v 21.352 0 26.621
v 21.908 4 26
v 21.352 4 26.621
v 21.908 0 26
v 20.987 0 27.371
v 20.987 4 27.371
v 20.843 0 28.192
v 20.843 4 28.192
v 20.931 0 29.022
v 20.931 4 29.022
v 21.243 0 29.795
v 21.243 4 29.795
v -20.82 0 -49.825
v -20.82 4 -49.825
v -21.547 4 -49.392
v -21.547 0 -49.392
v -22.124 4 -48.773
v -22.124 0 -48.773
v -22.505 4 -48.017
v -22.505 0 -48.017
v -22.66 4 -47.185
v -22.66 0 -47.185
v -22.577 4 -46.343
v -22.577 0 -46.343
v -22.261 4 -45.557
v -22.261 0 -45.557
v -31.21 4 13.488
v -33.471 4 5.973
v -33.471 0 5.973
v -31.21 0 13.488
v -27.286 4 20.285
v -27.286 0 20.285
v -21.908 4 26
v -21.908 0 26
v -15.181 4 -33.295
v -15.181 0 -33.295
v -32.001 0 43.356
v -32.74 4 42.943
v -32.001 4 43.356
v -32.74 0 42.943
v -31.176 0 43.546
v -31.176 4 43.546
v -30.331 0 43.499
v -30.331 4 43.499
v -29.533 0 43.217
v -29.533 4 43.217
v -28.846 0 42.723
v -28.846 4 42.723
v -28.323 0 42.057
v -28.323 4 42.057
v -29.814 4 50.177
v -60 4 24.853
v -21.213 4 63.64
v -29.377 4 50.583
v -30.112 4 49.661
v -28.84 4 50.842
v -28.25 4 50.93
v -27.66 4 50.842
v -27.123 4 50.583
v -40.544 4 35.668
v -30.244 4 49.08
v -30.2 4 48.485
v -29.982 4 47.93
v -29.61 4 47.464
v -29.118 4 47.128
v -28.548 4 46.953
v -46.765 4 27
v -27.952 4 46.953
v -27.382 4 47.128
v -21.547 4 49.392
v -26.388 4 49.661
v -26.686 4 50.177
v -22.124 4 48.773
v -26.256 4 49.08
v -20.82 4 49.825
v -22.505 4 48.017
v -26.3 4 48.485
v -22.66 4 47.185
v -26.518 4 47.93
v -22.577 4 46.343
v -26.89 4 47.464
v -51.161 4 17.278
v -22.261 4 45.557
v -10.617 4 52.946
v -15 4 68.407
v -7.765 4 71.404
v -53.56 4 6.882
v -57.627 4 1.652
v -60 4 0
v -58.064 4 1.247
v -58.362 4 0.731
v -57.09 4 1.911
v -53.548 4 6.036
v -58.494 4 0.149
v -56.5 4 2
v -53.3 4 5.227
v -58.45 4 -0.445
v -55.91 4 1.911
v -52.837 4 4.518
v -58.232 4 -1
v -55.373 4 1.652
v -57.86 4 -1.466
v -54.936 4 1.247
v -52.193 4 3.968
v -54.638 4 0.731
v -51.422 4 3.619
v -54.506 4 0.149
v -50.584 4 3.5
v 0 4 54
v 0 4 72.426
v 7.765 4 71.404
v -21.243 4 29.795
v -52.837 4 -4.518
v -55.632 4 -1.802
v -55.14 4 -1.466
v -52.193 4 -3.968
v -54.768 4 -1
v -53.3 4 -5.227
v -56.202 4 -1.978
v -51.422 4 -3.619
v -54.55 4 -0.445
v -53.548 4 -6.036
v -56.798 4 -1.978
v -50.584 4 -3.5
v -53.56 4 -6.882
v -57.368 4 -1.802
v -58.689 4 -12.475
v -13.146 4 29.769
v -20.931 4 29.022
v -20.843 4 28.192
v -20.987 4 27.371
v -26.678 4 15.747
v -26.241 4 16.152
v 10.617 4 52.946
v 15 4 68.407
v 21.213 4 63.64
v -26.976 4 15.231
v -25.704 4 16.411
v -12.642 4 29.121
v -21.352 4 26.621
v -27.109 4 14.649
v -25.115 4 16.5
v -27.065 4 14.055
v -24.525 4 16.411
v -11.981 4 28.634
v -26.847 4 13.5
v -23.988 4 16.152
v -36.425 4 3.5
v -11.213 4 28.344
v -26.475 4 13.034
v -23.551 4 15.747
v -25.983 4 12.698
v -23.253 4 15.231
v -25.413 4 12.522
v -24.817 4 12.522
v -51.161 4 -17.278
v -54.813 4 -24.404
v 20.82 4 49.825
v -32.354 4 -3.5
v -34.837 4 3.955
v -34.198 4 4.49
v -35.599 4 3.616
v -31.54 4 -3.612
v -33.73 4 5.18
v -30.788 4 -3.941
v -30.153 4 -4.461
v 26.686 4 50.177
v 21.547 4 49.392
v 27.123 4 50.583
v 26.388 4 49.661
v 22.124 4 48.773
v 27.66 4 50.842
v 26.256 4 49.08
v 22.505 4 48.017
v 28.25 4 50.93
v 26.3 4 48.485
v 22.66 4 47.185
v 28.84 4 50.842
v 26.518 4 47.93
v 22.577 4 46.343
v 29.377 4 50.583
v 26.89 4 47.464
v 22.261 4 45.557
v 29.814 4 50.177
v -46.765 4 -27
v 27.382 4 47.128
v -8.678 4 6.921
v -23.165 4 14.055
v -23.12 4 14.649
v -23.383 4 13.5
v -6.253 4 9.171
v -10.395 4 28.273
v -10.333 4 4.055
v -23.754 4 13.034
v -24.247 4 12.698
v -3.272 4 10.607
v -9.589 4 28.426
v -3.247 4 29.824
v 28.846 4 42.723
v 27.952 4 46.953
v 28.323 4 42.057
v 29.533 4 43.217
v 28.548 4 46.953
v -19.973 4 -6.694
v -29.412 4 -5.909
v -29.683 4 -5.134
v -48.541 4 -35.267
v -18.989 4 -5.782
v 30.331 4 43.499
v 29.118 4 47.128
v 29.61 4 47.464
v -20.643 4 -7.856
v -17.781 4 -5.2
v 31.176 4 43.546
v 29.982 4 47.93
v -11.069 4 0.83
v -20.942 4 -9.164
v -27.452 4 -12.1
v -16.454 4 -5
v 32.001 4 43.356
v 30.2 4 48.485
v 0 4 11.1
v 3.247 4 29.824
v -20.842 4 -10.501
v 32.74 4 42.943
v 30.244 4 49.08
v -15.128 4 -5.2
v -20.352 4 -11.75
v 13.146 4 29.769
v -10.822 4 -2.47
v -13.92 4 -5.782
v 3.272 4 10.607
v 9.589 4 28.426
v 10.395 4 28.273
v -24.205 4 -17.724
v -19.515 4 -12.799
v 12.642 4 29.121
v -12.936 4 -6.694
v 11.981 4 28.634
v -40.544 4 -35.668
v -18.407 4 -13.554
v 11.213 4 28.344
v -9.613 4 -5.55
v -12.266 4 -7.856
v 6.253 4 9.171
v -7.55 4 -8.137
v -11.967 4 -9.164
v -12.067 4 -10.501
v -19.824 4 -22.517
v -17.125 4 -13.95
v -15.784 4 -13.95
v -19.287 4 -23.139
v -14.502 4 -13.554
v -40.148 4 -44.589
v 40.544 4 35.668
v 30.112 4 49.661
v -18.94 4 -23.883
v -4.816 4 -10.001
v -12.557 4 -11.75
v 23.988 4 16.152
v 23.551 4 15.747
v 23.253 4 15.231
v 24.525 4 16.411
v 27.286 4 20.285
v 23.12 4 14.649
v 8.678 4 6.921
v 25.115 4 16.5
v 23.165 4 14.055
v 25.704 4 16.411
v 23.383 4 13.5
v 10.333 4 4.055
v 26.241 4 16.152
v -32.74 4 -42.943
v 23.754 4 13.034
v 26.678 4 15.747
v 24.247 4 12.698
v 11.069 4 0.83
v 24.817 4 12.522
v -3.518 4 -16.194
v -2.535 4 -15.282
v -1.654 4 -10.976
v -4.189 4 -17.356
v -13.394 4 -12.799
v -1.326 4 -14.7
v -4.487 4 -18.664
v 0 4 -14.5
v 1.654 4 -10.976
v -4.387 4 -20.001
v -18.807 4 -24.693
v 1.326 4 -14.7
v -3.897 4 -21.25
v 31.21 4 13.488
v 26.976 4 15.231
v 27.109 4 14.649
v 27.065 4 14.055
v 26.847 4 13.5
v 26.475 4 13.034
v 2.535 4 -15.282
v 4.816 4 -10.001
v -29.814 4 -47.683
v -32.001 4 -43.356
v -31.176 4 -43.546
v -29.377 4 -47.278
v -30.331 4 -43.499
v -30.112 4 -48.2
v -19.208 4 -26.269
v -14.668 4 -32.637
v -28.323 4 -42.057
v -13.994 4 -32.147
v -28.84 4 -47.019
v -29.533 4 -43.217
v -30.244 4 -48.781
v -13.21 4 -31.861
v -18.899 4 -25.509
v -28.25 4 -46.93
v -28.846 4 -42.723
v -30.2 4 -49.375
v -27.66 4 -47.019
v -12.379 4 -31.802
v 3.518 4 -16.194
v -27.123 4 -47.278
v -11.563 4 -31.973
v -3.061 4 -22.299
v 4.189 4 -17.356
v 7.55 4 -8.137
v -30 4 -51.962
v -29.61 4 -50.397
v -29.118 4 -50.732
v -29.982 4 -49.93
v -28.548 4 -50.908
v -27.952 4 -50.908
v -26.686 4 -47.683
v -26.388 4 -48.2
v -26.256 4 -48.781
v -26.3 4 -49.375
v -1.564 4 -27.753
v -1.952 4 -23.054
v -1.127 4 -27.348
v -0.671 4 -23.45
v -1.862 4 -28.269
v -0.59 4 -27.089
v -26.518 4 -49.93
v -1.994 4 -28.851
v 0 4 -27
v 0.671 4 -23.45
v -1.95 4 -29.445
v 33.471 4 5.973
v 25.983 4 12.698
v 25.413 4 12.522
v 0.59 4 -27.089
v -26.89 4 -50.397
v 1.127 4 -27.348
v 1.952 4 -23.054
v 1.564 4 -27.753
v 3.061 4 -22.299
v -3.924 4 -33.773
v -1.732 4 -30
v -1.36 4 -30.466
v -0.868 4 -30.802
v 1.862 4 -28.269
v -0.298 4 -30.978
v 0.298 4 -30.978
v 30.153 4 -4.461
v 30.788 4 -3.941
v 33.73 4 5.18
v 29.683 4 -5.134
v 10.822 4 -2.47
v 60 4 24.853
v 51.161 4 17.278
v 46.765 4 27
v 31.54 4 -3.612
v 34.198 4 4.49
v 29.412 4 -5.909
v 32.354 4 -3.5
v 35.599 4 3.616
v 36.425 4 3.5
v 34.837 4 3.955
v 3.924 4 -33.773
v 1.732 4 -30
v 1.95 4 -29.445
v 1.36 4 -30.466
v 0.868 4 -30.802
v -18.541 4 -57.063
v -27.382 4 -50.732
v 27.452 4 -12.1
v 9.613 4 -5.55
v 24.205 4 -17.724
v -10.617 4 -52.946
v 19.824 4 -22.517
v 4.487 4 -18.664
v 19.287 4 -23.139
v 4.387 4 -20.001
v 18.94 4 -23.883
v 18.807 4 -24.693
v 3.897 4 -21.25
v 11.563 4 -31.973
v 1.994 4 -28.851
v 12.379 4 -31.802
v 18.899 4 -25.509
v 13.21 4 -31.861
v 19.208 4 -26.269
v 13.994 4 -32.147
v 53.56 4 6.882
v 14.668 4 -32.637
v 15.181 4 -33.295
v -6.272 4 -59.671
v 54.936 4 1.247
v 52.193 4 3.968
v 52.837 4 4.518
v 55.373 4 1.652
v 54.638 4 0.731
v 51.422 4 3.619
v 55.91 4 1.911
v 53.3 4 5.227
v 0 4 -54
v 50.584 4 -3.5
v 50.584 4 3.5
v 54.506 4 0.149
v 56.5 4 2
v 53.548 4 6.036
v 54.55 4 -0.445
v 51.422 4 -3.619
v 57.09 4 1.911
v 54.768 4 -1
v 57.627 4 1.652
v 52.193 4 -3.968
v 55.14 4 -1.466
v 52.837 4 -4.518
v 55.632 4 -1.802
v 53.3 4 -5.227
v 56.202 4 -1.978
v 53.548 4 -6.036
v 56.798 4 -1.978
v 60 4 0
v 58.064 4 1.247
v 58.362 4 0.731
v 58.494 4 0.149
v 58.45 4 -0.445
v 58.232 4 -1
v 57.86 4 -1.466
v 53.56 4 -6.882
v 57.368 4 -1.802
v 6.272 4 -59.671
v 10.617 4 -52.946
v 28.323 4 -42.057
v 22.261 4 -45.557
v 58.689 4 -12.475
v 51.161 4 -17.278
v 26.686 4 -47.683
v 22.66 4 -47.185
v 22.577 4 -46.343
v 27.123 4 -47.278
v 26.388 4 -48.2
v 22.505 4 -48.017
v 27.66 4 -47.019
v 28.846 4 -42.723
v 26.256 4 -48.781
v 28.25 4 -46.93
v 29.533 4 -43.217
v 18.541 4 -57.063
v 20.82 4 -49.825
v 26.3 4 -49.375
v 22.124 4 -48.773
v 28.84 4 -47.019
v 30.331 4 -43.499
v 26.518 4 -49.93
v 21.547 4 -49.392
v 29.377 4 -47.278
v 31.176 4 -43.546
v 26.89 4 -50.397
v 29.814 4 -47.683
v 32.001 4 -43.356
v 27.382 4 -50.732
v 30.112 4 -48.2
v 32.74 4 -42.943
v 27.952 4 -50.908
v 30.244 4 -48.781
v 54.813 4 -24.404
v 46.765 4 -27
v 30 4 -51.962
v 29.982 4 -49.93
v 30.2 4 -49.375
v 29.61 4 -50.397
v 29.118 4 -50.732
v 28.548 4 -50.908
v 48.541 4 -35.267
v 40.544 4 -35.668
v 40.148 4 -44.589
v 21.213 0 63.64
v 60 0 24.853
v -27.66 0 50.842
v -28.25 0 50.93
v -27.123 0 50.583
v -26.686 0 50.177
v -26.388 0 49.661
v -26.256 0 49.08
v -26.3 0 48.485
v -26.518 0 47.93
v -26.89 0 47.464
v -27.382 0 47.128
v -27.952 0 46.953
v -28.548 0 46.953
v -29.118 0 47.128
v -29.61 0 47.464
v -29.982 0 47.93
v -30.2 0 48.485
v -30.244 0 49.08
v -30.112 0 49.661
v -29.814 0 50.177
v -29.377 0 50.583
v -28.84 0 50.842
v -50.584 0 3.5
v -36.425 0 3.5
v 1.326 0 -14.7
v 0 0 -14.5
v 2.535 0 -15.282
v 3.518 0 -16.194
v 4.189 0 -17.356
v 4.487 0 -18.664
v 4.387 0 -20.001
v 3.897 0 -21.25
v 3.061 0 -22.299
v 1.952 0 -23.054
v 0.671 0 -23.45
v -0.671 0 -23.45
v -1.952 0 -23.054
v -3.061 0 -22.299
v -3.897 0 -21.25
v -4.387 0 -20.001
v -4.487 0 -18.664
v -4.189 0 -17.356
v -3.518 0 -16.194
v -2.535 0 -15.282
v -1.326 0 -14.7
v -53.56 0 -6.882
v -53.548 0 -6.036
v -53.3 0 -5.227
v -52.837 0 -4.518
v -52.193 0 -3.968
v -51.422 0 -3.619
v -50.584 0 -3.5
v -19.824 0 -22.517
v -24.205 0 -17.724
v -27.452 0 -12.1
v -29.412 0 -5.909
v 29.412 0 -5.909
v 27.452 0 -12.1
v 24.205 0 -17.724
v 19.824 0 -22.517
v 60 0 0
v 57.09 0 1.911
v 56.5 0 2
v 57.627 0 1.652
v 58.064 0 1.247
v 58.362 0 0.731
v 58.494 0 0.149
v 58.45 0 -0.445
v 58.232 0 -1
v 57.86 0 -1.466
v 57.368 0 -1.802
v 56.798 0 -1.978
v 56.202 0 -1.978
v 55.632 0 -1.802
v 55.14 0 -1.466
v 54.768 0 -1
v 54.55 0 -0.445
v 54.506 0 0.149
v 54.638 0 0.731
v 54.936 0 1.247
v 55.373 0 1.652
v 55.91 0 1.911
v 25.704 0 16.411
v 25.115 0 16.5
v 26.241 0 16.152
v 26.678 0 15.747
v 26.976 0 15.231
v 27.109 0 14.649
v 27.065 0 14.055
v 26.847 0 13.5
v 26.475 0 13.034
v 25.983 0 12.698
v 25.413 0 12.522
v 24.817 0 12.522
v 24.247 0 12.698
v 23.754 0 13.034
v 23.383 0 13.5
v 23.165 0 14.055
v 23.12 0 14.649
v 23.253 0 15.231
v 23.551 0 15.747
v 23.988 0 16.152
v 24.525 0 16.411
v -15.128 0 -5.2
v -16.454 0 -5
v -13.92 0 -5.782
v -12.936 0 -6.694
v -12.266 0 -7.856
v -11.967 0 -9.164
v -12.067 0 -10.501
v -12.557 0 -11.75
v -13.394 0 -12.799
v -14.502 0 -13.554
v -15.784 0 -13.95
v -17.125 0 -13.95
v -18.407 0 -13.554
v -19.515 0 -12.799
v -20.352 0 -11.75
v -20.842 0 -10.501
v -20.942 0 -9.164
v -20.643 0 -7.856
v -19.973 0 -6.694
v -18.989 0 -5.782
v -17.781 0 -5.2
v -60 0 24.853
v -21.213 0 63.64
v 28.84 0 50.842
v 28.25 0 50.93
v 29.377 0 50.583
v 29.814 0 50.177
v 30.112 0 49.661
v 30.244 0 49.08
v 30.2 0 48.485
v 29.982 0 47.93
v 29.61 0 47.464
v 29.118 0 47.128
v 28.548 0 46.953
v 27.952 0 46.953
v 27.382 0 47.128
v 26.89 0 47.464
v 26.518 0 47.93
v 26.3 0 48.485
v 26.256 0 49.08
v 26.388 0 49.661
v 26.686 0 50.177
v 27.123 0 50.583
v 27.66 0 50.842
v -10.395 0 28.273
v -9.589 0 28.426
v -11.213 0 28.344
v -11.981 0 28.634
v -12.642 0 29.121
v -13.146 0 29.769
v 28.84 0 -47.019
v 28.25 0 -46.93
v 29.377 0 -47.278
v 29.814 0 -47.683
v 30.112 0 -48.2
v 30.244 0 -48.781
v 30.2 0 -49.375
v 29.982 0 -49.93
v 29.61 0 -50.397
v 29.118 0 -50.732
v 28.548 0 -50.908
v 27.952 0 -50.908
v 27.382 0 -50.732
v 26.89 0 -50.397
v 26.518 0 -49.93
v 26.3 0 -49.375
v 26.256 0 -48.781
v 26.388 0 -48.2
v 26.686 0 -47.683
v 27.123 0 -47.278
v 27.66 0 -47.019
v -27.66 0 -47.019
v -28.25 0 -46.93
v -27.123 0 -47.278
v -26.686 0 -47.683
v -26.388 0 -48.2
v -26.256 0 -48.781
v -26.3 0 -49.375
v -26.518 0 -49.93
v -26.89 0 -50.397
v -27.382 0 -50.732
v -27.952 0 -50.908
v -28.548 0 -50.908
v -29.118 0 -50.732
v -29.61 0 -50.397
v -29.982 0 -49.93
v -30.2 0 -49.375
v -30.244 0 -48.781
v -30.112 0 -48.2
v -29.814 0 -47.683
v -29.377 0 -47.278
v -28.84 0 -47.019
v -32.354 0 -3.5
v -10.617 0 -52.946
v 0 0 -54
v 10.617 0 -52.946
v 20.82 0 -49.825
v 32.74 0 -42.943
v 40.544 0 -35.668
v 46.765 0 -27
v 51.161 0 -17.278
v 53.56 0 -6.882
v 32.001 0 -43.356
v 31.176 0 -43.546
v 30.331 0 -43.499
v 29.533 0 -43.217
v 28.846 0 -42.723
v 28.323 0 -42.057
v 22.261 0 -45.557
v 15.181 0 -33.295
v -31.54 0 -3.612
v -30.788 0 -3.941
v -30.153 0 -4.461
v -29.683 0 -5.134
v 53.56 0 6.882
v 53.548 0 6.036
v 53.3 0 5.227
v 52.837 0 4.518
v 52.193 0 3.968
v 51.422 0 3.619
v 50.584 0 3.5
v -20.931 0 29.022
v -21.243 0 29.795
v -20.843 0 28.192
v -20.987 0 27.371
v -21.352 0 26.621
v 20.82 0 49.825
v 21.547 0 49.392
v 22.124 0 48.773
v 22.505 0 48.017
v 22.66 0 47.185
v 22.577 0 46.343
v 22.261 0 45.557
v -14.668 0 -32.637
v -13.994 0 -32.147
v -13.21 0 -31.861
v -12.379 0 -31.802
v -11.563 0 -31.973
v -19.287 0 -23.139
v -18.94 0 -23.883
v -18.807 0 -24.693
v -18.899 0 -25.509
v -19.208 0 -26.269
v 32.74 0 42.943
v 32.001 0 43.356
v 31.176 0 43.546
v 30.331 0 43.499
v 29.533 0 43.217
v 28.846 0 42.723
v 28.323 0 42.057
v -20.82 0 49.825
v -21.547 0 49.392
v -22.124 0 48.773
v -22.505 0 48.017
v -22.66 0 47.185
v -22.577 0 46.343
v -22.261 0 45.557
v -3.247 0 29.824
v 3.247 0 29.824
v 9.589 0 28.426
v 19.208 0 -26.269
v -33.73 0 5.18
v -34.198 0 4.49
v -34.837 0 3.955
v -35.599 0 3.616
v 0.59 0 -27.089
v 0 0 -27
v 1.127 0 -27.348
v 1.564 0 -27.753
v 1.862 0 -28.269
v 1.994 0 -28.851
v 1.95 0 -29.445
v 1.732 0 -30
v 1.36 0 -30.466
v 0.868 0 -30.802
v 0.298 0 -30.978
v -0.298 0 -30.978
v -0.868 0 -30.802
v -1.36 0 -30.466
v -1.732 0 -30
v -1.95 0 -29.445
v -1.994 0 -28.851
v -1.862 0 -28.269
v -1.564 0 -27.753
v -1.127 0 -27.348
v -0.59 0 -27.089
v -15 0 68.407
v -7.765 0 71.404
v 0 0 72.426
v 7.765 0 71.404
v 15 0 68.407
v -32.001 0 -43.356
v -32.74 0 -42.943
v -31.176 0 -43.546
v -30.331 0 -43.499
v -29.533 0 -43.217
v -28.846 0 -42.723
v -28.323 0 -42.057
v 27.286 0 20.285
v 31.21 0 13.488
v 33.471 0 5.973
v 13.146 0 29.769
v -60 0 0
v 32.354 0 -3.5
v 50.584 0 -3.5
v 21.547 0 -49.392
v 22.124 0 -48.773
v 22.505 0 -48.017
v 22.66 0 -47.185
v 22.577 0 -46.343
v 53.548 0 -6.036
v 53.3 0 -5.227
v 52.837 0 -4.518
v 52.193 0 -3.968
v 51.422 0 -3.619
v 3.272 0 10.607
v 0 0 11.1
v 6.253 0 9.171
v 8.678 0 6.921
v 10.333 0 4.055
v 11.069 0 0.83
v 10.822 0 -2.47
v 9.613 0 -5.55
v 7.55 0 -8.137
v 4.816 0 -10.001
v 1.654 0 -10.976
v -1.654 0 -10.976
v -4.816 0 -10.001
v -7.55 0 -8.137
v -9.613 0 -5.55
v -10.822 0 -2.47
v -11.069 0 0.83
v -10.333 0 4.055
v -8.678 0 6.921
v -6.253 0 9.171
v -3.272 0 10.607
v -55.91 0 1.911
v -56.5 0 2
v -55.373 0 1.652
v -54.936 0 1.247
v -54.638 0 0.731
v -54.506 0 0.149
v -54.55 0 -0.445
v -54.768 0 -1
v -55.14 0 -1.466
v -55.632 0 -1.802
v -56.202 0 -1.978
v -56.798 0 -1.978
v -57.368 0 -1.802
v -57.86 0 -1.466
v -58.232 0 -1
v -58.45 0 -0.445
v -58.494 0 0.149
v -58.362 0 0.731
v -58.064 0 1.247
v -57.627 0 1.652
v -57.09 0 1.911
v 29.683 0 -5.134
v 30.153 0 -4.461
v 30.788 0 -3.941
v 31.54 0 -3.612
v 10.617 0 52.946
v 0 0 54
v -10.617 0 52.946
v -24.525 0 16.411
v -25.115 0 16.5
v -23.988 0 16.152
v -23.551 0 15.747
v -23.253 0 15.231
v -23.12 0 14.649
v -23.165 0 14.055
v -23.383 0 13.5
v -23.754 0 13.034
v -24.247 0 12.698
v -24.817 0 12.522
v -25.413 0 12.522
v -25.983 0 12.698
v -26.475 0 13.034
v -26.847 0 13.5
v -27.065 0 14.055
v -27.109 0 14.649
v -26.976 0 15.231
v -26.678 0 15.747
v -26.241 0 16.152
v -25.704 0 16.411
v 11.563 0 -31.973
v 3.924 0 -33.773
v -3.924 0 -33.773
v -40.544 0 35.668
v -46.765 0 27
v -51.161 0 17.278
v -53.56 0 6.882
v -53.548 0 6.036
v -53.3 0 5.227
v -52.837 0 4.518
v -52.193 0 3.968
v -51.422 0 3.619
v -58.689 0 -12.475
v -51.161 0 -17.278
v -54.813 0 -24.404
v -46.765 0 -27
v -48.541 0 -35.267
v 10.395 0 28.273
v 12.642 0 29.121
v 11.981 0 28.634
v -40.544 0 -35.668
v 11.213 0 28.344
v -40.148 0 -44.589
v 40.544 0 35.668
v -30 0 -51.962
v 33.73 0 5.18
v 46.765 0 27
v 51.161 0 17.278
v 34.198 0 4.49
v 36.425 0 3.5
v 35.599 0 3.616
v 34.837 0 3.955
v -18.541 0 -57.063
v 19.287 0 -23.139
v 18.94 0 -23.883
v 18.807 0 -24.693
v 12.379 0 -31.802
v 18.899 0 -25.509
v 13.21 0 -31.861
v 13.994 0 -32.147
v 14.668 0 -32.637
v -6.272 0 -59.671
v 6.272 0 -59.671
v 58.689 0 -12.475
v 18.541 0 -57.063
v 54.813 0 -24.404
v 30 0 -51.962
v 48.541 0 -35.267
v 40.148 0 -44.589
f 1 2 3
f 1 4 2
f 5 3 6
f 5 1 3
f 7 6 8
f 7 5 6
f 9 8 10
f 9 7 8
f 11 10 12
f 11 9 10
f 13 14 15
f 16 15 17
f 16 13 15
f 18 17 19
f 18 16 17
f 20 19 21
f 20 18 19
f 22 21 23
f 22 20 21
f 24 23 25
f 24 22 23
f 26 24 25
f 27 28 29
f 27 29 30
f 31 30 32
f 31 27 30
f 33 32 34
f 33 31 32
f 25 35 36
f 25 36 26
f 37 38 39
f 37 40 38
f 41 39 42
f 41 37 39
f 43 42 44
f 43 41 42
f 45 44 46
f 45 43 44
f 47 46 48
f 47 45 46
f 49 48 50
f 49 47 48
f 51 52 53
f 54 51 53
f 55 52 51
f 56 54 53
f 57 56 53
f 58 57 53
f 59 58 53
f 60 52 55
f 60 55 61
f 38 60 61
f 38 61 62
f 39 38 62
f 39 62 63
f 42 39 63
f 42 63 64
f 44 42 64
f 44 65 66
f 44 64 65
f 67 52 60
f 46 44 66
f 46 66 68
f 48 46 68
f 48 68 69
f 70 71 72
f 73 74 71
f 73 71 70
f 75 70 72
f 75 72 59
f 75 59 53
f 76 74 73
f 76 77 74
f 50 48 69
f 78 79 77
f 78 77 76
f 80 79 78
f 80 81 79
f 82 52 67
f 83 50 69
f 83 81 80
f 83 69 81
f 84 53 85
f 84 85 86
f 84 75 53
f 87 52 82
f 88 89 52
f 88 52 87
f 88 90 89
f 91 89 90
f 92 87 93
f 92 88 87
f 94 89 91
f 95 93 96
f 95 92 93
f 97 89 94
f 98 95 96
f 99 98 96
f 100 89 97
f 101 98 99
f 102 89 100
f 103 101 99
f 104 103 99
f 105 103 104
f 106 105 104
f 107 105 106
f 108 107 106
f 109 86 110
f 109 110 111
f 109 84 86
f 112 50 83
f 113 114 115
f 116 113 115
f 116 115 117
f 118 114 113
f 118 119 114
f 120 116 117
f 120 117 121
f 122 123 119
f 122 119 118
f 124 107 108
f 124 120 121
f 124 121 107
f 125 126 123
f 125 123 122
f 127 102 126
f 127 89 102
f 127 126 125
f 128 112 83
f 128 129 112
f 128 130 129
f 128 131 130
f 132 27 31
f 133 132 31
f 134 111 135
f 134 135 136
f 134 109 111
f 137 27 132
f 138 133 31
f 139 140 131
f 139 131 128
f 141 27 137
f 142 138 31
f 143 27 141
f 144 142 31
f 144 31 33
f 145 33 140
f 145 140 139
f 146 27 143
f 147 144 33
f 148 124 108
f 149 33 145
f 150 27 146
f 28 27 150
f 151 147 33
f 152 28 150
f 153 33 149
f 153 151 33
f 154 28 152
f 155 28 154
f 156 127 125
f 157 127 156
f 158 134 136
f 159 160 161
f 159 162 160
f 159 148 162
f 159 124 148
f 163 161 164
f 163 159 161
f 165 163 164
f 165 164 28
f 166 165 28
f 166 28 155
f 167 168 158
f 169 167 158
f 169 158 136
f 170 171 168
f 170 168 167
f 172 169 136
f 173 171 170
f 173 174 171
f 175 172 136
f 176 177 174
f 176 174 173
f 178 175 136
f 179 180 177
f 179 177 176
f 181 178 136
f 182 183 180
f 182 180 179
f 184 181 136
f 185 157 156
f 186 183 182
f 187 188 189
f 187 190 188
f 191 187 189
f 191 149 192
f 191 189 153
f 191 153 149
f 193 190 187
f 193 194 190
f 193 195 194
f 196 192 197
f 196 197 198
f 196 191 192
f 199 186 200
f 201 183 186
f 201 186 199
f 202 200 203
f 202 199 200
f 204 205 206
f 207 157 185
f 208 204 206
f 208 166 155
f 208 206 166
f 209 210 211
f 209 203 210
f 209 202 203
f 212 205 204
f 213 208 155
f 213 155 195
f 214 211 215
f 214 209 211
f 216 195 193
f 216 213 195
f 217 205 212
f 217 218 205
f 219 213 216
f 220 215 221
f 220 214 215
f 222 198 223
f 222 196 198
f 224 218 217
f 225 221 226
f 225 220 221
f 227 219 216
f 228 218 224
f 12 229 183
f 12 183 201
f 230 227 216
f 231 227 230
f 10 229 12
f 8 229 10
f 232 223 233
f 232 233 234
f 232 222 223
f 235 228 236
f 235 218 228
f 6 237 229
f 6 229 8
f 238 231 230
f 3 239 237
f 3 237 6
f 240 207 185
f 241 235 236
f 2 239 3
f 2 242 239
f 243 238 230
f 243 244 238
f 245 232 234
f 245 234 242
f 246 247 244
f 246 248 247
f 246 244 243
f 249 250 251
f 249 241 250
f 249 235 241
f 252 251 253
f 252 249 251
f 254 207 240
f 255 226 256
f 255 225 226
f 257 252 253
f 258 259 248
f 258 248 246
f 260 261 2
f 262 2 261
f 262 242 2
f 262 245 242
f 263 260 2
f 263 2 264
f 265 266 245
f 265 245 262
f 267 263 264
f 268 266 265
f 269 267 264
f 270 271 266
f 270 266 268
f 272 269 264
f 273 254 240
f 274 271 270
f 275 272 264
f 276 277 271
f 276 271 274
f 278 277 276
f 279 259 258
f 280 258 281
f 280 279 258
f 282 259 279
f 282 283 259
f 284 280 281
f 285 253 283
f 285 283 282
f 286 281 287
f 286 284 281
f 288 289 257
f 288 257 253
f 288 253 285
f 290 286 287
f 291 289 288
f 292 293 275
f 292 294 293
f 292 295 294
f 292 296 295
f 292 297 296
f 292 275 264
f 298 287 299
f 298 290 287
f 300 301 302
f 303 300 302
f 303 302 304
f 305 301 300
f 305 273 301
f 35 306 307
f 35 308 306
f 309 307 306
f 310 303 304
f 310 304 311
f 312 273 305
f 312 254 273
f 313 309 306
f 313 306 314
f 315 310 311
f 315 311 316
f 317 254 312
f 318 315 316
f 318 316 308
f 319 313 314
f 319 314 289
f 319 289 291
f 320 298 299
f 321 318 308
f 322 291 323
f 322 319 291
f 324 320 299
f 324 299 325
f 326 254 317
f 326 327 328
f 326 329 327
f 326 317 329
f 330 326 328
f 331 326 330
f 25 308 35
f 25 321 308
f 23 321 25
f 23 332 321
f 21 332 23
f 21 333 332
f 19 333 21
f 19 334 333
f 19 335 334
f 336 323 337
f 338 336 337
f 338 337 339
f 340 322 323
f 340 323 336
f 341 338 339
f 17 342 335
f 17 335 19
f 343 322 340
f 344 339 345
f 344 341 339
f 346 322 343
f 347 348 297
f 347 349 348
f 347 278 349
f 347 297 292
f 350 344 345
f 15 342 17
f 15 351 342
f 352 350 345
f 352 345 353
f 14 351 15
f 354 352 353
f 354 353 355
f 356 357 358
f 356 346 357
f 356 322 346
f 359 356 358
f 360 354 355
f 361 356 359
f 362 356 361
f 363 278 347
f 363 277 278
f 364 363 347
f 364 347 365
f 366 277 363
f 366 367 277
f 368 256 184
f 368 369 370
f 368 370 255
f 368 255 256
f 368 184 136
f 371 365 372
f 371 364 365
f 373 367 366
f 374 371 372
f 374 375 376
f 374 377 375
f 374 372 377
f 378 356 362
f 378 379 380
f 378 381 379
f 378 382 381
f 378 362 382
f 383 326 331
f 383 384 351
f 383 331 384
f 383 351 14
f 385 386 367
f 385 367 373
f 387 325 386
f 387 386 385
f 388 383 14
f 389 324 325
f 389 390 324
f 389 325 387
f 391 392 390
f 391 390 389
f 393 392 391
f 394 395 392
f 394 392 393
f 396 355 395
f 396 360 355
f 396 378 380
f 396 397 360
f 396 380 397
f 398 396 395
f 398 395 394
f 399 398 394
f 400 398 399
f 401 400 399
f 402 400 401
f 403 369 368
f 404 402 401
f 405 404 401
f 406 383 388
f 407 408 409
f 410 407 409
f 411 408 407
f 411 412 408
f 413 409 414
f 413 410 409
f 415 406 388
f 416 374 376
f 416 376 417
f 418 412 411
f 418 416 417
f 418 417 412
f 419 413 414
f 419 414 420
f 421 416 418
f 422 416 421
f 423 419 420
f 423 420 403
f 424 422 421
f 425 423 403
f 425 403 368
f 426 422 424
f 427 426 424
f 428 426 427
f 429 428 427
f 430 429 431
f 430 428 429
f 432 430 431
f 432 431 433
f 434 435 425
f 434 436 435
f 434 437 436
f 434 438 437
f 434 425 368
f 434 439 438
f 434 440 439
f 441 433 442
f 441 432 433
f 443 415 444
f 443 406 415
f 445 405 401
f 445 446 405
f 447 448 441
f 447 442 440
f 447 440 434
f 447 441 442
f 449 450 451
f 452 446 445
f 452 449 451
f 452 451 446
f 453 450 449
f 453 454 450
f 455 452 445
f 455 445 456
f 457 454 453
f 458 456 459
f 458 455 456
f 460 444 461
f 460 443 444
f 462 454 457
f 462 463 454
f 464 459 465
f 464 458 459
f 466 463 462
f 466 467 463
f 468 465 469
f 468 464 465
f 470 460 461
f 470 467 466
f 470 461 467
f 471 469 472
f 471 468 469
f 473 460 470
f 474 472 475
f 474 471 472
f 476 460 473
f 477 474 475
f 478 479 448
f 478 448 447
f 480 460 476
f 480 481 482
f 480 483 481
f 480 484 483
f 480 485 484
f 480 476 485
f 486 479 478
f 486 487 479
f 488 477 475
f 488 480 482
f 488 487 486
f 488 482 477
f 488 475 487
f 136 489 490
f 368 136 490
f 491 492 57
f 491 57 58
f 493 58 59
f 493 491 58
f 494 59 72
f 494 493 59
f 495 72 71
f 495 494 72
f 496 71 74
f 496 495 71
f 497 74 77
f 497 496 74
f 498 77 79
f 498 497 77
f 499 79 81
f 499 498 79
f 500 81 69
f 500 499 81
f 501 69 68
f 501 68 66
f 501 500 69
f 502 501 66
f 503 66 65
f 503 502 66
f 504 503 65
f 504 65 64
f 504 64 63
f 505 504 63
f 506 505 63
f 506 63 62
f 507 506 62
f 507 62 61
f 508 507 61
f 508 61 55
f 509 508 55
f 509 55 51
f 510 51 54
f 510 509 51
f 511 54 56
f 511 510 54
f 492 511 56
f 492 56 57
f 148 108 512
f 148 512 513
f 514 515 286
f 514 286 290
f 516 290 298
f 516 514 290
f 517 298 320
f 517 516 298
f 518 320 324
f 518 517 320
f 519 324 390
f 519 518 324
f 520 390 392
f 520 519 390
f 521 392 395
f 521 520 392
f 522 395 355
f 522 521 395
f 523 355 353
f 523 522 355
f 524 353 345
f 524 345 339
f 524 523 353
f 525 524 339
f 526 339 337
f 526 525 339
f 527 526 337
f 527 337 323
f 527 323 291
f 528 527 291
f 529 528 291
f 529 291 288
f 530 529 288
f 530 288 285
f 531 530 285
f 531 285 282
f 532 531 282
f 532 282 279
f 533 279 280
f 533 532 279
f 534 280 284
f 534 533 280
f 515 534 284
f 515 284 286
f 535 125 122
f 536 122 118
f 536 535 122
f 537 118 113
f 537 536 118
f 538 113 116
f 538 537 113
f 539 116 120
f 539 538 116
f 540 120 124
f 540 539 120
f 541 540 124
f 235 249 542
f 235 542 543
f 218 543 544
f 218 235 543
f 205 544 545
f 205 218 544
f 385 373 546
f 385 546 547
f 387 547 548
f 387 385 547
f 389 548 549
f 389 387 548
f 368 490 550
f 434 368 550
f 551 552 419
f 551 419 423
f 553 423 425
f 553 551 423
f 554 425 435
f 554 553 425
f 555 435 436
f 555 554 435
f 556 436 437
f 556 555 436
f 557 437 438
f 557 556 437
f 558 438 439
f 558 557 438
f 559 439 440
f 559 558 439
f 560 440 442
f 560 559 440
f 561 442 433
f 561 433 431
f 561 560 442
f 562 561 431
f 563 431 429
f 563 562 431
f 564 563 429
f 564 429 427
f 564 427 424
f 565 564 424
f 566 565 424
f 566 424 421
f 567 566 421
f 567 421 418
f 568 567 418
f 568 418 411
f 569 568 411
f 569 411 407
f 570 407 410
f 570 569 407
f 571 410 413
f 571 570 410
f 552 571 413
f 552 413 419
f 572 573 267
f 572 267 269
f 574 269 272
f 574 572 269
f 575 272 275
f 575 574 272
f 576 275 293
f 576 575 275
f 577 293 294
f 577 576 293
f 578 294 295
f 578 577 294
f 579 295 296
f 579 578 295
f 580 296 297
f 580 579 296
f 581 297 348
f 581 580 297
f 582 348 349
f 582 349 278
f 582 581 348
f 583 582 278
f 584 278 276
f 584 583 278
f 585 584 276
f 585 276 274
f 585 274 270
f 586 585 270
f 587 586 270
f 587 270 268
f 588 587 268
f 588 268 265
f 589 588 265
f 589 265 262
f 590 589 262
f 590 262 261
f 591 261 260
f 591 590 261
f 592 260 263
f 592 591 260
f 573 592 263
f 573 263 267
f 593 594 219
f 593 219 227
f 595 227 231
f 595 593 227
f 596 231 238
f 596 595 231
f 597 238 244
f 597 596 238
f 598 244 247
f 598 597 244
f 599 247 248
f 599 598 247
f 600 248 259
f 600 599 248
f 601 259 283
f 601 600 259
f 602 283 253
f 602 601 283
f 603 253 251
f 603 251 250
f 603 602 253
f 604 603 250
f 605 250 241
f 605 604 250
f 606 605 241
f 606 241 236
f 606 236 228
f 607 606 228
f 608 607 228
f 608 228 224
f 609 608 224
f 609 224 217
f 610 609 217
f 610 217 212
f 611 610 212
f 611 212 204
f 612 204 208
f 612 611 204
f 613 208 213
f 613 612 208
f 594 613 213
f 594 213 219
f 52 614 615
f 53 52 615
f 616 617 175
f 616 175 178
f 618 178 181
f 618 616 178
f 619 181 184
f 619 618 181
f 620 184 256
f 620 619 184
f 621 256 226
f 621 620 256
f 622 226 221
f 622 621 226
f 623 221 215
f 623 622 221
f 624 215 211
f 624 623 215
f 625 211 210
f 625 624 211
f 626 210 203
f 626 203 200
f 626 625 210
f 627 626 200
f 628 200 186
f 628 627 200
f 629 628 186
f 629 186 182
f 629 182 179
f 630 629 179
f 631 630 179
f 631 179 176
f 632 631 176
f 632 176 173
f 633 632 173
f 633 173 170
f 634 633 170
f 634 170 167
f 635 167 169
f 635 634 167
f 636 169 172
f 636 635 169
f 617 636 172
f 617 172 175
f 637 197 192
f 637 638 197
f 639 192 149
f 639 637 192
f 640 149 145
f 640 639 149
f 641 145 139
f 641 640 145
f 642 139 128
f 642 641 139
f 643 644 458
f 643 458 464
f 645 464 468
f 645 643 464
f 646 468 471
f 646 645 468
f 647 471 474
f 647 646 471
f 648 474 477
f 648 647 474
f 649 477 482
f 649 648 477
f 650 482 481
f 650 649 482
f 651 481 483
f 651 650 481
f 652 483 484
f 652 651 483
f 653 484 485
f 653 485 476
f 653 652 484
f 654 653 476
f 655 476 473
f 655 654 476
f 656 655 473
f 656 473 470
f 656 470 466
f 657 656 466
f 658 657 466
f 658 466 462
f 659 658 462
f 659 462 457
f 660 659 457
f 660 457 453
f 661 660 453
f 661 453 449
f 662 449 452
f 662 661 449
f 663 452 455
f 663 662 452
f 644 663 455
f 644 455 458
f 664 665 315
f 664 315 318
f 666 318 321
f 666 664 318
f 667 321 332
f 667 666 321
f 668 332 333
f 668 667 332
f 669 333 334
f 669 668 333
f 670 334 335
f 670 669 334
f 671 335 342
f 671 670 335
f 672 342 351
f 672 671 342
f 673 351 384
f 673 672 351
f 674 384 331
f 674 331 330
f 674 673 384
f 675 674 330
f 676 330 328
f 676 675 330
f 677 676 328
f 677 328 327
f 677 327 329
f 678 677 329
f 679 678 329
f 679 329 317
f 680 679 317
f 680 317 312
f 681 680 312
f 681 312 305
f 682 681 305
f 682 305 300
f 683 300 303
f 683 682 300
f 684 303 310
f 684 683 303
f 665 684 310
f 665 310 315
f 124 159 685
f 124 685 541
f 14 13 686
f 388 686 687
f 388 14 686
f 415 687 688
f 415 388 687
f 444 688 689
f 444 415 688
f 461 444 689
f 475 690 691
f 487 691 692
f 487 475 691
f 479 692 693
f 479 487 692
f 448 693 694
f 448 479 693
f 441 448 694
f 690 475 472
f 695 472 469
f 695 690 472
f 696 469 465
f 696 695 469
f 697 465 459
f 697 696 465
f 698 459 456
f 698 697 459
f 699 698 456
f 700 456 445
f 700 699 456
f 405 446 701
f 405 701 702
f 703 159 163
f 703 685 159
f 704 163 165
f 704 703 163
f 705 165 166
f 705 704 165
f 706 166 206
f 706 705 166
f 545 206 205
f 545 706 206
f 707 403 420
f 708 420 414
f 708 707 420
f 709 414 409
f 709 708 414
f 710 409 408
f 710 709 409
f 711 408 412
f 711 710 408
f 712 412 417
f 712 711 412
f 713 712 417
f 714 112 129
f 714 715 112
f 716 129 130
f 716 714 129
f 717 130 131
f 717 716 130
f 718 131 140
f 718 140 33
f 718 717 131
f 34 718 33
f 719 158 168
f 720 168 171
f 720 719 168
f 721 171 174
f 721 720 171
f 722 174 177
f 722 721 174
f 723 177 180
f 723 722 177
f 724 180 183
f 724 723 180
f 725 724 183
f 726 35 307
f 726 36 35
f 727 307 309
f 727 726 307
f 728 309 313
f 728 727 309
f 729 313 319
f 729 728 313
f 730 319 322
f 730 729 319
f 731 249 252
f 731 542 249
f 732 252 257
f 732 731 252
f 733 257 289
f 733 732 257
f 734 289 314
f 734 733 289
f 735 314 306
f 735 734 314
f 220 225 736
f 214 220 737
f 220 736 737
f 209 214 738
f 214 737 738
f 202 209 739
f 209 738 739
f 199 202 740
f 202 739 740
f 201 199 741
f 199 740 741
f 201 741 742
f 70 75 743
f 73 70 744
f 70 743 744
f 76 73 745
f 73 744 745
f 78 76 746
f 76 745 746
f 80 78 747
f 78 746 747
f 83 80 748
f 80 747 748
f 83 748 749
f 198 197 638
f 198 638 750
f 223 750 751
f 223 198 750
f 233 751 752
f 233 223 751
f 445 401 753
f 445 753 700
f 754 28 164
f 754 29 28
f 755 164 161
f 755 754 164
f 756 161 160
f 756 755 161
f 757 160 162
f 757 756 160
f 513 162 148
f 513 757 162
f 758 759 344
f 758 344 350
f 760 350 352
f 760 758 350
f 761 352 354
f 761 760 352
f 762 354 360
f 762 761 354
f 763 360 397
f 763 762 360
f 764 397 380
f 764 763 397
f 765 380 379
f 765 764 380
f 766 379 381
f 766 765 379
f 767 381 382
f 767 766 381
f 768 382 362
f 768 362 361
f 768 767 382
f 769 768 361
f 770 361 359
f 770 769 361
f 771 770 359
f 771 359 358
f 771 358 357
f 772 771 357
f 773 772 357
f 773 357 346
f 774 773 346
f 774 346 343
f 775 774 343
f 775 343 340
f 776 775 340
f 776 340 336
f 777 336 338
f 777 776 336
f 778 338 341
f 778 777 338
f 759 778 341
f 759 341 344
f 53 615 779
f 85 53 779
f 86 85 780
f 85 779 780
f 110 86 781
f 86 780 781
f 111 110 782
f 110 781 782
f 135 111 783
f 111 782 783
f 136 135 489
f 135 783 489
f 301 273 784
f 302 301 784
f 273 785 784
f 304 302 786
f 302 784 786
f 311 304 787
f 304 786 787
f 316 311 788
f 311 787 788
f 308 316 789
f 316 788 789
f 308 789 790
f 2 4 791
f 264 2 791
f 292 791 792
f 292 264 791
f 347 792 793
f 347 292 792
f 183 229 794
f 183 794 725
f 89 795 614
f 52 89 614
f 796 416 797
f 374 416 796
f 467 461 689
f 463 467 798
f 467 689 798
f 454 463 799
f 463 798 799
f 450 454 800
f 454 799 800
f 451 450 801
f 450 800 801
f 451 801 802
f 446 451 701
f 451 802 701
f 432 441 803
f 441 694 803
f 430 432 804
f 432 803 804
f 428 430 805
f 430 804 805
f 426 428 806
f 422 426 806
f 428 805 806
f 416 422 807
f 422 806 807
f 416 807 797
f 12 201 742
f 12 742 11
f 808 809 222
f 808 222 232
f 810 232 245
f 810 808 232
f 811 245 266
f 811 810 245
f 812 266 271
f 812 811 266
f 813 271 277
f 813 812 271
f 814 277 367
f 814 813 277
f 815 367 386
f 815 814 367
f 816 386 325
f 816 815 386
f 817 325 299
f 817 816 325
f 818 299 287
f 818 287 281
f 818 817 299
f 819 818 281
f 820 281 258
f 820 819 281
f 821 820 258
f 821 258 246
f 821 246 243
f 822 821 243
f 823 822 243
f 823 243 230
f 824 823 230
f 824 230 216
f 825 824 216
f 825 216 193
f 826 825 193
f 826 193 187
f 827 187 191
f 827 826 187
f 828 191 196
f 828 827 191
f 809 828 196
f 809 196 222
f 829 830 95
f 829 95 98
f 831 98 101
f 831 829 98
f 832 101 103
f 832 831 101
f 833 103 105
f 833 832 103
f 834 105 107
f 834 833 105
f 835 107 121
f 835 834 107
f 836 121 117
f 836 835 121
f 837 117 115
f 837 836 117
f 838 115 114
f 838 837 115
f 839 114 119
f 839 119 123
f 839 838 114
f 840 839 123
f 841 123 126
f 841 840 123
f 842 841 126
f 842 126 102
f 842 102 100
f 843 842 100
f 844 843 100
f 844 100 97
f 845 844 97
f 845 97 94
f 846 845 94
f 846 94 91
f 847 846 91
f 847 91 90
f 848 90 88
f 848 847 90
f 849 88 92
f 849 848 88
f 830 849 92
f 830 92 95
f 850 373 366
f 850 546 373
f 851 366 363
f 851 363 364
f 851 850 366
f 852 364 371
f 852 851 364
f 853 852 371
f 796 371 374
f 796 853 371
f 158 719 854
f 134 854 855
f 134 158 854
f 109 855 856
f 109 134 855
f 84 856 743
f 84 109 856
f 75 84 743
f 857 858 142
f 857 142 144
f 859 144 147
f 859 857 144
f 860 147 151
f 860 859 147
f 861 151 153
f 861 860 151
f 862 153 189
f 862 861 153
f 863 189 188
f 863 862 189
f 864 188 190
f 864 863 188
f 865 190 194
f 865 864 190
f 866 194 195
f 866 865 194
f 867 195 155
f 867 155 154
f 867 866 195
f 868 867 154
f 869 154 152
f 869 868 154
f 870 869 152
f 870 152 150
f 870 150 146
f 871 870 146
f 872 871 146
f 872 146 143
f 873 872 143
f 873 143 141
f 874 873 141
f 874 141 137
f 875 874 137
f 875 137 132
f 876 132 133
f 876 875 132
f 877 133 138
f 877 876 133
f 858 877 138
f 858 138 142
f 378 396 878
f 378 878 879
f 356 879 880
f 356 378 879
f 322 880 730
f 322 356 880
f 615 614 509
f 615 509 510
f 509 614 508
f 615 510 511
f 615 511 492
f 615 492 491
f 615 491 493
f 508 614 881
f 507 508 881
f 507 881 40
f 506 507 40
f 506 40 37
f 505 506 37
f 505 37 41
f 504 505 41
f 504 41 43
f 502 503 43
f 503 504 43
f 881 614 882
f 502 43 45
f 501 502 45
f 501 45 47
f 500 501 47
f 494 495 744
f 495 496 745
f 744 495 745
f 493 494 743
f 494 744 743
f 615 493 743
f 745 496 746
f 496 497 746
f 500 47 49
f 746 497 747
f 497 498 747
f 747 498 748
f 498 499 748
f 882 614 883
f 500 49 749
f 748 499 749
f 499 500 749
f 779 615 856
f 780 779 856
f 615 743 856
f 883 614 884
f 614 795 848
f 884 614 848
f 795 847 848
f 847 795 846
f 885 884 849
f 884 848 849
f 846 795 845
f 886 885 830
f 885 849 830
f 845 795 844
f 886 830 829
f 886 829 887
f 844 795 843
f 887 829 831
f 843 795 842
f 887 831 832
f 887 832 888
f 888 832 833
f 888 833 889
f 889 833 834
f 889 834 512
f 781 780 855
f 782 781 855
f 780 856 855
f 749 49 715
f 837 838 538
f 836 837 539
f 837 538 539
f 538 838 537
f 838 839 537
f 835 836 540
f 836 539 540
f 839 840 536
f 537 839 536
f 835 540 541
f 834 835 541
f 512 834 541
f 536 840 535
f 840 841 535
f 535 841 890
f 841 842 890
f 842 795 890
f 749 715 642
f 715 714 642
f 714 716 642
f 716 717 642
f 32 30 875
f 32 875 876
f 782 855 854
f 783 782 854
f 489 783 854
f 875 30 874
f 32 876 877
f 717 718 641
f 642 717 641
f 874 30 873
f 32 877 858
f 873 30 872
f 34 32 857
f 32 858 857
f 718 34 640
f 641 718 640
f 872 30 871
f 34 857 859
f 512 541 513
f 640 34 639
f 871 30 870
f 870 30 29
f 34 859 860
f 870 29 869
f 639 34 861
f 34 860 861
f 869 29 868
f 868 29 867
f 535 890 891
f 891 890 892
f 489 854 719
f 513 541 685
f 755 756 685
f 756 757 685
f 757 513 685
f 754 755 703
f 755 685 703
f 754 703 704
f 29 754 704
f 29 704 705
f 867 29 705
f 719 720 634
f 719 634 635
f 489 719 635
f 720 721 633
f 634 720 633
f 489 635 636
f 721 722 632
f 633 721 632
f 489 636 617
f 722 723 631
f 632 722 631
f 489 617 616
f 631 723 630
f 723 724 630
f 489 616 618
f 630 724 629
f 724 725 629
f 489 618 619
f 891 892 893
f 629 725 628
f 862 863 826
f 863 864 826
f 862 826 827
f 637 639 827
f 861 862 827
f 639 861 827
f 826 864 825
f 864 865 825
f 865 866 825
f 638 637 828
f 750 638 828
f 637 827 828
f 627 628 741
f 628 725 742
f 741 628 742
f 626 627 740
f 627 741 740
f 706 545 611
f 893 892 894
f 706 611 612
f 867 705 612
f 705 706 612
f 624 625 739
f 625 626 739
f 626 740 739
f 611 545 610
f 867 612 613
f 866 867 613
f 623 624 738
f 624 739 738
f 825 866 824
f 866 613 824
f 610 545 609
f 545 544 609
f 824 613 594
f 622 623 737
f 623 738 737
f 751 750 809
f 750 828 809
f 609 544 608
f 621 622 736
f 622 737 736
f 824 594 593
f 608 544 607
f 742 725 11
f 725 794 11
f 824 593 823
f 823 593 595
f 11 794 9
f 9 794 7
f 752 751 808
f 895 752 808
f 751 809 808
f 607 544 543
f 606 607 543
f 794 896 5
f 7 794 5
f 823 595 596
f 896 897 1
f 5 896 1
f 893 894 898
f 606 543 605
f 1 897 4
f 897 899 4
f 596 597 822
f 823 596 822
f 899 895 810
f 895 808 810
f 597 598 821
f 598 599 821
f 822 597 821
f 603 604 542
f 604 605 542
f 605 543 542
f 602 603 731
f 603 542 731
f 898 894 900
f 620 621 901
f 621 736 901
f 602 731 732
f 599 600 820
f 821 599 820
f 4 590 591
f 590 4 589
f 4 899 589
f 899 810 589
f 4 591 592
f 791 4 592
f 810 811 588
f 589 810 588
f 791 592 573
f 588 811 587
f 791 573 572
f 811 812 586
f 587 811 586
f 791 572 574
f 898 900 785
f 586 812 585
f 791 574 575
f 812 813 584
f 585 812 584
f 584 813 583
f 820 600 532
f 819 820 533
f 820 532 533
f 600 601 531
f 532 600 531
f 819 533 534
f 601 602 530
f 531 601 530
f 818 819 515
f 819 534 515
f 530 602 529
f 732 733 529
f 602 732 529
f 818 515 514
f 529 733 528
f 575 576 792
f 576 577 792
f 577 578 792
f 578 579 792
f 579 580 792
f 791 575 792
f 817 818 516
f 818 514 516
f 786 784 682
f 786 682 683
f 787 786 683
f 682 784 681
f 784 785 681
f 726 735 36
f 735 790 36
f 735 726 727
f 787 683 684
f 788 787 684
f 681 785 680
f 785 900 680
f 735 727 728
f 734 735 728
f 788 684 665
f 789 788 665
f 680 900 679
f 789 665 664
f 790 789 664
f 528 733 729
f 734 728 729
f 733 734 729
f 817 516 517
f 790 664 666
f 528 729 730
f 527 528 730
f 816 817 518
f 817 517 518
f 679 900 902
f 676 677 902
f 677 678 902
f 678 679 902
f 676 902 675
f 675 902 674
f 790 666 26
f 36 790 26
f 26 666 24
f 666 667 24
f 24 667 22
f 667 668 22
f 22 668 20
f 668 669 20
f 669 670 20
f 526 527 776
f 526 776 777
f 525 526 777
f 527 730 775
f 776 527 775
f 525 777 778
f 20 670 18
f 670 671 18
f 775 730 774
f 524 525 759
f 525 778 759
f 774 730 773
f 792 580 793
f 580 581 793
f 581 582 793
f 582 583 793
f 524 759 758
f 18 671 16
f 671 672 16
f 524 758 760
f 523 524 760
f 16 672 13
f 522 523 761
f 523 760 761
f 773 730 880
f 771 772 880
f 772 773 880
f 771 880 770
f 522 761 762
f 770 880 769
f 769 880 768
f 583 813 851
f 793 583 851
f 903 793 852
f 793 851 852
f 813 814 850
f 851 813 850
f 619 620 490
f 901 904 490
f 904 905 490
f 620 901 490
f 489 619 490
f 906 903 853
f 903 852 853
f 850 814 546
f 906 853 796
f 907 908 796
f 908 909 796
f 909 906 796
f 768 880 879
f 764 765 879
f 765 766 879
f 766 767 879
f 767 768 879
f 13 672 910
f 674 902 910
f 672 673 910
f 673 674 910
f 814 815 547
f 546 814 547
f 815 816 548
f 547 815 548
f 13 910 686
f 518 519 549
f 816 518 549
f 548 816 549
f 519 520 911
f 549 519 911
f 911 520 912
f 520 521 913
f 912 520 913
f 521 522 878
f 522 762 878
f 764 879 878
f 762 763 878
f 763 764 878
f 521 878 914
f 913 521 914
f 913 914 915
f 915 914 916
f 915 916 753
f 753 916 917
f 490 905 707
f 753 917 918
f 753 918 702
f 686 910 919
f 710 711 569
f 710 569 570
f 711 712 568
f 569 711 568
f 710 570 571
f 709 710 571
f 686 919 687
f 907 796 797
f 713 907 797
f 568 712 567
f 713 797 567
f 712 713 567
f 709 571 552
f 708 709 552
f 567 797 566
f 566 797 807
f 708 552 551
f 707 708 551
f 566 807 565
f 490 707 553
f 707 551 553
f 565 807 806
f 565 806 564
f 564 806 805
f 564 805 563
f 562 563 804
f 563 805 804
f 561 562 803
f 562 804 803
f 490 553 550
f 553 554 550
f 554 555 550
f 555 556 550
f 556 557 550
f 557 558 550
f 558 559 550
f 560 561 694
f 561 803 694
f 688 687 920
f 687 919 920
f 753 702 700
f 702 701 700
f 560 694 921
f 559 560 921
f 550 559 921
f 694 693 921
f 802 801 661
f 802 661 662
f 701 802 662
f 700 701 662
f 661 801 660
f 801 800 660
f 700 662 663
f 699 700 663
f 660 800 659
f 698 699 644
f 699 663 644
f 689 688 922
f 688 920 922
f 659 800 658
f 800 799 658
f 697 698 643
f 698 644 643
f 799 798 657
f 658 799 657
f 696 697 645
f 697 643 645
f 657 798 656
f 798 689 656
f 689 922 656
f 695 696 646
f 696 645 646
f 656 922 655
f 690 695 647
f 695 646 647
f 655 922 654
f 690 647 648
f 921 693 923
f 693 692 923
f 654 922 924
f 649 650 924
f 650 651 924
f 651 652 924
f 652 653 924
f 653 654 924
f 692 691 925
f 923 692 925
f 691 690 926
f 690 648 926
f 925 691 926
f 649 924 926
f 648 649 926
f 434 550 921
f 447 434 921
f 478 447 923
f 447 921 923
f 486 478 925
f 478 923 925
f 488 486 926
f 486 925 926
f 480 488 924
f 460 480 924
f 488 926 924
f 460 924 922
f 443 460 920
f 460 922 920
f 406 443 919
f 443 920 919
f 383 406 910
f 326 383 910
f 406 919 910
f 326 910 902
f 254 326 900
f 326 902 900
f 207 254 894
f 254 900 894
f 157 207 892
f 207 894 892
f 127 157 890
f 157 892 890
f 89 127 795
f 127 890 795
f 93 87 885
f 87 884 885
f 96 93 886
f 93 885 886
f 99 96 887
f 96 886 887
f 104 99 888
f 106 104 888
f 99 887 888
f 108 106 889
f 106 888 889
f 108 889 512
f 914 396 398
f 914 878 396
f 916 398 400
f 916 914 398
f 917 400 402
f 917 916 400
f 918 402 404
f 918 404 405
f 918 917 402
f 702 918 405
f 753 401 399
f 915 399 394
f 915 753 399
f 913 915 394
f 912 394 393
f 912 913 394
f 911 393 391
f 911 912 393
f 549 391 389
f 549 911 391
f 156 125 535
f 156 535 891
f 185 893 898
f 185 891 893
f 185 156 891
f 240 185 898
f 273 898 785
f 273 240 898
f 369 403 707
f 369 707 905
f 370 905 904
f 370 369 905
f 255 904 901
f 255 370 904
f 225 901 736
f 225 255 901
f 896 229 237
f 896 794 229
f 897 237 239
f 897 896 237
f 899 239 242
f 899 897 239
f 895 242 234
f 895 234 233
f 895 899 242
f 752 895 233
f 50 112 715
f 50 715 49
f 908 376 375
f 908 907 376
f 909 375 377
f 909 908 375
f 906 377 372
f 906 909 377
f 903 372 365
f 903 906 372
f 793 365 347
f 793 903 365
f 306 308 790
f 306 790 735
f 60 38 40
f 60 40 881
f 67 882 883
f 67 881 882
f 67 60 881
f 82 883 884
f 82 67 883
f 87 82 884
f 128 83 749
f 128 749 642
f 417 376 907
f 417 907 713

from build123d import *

# Parameters (mm, degrees)
SKETCH_1_R          = 2
SKETCH_1_R_2        = 11.1
SKETCH_1_R_3        = 4.5
EXTRUDE_1_DEPTH     = 4
CUT_EXTRUDE_1_DEPTH = 95.135988932
FILLET_2_R          = 3


with BuildPart() as part:
    # 草图1 → 凸台-拉伸1 (new body)
    with BuildSketch(Plane(origin=(0, 0, 0), x_dir=(1, 0, 0), z_dir=(0, 1, 0))):
        with BuildLine():
            Line((-60, -24.852813742), (-21.213203436, -63.639610307))
            ThreePointArc((-21.213203436, -63.639610307), (0, -72.426406871), (21.213203436, -63.639610307))
            Line((21.213203436, -63.639610307), (60, -24.852813742))
            Line((60, -24.852813742), (60, 0))
            ThreePointArc((60, 0), (0, 60), (-60, 0))
            Line((-60, 0), (-60, -24.852813742))
        make_face()
        with Locations(Location((-28.25, 48.930435314, 0), (0, 0, 270))):
            Circle(SKETCH_1_R, mode=Mode.SUBTRACT)
        with Locations(Location((28.25, 48.930435314, 0), (0, 0, 270))):
            Circle(SKETCH_1_R, mode=Mode.SUBTRACT)
        with Locations(Location((56.5, 0, 0), (0, 0, 270))):
            Circle(SKETCH_1_R, mode=Mode.SUBTRACT)
        with Locations(Location((28.25, -48.930435314, 0), (0, 0, 270))):
            Circle(SKETCH_1_R, mode=Mode.SUBTRACT)
        with Locations(Location((0, 0, 0), (0, 0, 270))):
            Circle(SKETCH_1_R_2, mode=Mode.SUBTRACT)
        with Locations(Location((-28.25, -48.930435314, 0), (0, 0, 270))):
            Circle(SKETCH_1_R, mode=Mode.SUBTRACT)
        with Locations(Location((-56.5, 0, 0), (0, 0, 270))):
            Circle(SKETCH_1_R, mode=Mode.SUBTRACT)
        with Locations(Location((0, 29, 0), (0, 0, 270))):
            Circle(SKETCH_1_R, mode=Mode.SUBTRACT)
        with Locations(Location((25.11473671, -14.5, 0), (0, 0, 270))):
            Circle(SKETCH_1_R, mode=Mode.SUBTRACT)
        with Locations(Location((-25.11473671, -14.5, 0), (0, 0, 270))):
            Circle(SKETCH_1_R, mode=Mode.SUBTRACT)
        with Locations(Location((0, 19, 0), (0, 0, 270))):
            Circle(SKETCH_1_R_3, mode=Mode.SUBTRACT)
        with Locations(Location((-16.454482672, 9.5, 0), (0, 0, 270))):
            Circle(SKETCH_1_R_3, mode=Mode.SUBTRACT)
    extrude(amount=EXTRUDE_1_DEPTH)

    # 草图2 → 切除-拉伸1 (cut, through all)
    with BuildSketch(Plane(origin=(0, 4, 0), x_dir=(1, 0, 0), z_dir=(0, 1, 0))):
        with BuildLine():
            Line((-29.974316263, 44.917038689), (-17.928655829, 24.053342807))
            ThreePointArc((-17.928655829, 24.053342807), (-25.980762114, 15), (-29.795133831, 3.5))
            Line((-29.795133831, 3.5), (-53.886454699, 3.5))
            ThreePointArc((-53.886454699, 3.5), (-46.765371804, 27), (-29.974316263, 44.917038689))
        make_face()
        with BuildLine():
            Line((23.912138436, 48.417038689), (13.87859766, 31.038436285))
            ThreePointArc((13.87859766, 31.038436285), (0, 34), (-13.87859766, 31.038436285))
            Line((-13.87859766, 31.038436285), (-23.912138436, 48.417038689))
            ThreePointArc((-23.912138436, 48.417038689), (0, 54), (23.912138436, 48.417038689))
        make_face()
        with BuildLine():
            Line((53.886454699, 3.5), (29.795133831, 3.5))
            ThreePointArc((29.795133831, 3.5), (25.980762114, 15), (17.928655829, 24.053342807))
            Line((17.928655829, 24.053342807), (29.974316263, 44.917038689))
            ThreePointArc((29.974316263, 44.917038689), (46.765371804, 27), (53.886454699, 3.5))
        make_face()
        with BuildLine():
            Line((29.974316263, -44.917038689), (19.940775486, -27.538436285))
            ThreePointArc((19.940775486, -27.538436285), (29.444863729, -17), (33.819373146, -3.5))
            Line((33.819373146, -3.5), (53.886454699, -3.5))
            ThreePointArc((53.886454699, -3.5), (46.765371804, -27), (29.974316263, -44.917038689))
        make_face()
        with BuildLine():
            Line((-23.912138436, -48.417038689), (-11.866478002, -27.553342807))
            ThreePointArc((-11.866478002, -27.553342807), (0, -30), (11.866478002, -27.553342807))
            Line((11.866478002, -27.553342807), (23.912138436, -48.417038689))
            ThreePointArc((23.912138436, -48.417038689), (0, -54), (-23.912138436, -48.417038689))
        make_face()
        with BuildLine():
            Line((-53.886454699, -3.5), (-33.819373146, -3.5))
            ThreePointArc((-33.819373146, -3.5), (-29.444863729, -17), (-19.940775486, -27.538436285))
            Line((-19.940775486, -27.538436285), (-29.974316263, -44.917038689))
            ThreePointArc((-29.974316263, -44.917038689), (-46.765371804, -27), (-53.886454699, -3.5))
        make_face()
    extrude(amount=-CUT_EXTRUDE_1_DEPTH, mode=Mode.SUBTRACT)

    # 圆角2
    fillet_2_edges = [part.edges().sort_by_distance(p)[0] for p in [
        (29.974316263, 2, -44.917038689),
        (53.886454699, 2, -3.5),
        (29.795133831, 2, -3.5),
        (17.928655829, 2, -24.053342807),
        (19.940775486, 2, 27.538436285),
        (33.819373146, 2, 3.5),
        (53.886454699, 2, 3.5),
        (29.974316263, 2, 44.917038689),
        (13.87859766, 2, -31.038436285),
        (-13.87859766, 2, -31.038436285),
        (-23.912138436, 2, -48.417038689),
        (23.912138436, 2, -48.417038689),
        (-29.974316263, 2, 44.917038689),
        (-53.886454699, 2, 3.5),
        (-33.819373146, 2, 3.5),
        (-19.940775486, 2, 27.538436285),
        (-53.886454699, 2, -3.5),
        (-29.974316263, 2, -44.917038689),
        (-17.928655829, 2, -24.053342807),
        (-29.795133831, 2, -3.5),
        (23.912138436, 2, 48.417038689),
        (-23.912138436, 2, 48.417038689),
        (-11.866478002, 2, 27.553342807),
        (11.866478002, 2, 27.553342807),
    ]]
    fillet(fillet_2_edges, radius=FILLET_2_R)


solid = part.part
